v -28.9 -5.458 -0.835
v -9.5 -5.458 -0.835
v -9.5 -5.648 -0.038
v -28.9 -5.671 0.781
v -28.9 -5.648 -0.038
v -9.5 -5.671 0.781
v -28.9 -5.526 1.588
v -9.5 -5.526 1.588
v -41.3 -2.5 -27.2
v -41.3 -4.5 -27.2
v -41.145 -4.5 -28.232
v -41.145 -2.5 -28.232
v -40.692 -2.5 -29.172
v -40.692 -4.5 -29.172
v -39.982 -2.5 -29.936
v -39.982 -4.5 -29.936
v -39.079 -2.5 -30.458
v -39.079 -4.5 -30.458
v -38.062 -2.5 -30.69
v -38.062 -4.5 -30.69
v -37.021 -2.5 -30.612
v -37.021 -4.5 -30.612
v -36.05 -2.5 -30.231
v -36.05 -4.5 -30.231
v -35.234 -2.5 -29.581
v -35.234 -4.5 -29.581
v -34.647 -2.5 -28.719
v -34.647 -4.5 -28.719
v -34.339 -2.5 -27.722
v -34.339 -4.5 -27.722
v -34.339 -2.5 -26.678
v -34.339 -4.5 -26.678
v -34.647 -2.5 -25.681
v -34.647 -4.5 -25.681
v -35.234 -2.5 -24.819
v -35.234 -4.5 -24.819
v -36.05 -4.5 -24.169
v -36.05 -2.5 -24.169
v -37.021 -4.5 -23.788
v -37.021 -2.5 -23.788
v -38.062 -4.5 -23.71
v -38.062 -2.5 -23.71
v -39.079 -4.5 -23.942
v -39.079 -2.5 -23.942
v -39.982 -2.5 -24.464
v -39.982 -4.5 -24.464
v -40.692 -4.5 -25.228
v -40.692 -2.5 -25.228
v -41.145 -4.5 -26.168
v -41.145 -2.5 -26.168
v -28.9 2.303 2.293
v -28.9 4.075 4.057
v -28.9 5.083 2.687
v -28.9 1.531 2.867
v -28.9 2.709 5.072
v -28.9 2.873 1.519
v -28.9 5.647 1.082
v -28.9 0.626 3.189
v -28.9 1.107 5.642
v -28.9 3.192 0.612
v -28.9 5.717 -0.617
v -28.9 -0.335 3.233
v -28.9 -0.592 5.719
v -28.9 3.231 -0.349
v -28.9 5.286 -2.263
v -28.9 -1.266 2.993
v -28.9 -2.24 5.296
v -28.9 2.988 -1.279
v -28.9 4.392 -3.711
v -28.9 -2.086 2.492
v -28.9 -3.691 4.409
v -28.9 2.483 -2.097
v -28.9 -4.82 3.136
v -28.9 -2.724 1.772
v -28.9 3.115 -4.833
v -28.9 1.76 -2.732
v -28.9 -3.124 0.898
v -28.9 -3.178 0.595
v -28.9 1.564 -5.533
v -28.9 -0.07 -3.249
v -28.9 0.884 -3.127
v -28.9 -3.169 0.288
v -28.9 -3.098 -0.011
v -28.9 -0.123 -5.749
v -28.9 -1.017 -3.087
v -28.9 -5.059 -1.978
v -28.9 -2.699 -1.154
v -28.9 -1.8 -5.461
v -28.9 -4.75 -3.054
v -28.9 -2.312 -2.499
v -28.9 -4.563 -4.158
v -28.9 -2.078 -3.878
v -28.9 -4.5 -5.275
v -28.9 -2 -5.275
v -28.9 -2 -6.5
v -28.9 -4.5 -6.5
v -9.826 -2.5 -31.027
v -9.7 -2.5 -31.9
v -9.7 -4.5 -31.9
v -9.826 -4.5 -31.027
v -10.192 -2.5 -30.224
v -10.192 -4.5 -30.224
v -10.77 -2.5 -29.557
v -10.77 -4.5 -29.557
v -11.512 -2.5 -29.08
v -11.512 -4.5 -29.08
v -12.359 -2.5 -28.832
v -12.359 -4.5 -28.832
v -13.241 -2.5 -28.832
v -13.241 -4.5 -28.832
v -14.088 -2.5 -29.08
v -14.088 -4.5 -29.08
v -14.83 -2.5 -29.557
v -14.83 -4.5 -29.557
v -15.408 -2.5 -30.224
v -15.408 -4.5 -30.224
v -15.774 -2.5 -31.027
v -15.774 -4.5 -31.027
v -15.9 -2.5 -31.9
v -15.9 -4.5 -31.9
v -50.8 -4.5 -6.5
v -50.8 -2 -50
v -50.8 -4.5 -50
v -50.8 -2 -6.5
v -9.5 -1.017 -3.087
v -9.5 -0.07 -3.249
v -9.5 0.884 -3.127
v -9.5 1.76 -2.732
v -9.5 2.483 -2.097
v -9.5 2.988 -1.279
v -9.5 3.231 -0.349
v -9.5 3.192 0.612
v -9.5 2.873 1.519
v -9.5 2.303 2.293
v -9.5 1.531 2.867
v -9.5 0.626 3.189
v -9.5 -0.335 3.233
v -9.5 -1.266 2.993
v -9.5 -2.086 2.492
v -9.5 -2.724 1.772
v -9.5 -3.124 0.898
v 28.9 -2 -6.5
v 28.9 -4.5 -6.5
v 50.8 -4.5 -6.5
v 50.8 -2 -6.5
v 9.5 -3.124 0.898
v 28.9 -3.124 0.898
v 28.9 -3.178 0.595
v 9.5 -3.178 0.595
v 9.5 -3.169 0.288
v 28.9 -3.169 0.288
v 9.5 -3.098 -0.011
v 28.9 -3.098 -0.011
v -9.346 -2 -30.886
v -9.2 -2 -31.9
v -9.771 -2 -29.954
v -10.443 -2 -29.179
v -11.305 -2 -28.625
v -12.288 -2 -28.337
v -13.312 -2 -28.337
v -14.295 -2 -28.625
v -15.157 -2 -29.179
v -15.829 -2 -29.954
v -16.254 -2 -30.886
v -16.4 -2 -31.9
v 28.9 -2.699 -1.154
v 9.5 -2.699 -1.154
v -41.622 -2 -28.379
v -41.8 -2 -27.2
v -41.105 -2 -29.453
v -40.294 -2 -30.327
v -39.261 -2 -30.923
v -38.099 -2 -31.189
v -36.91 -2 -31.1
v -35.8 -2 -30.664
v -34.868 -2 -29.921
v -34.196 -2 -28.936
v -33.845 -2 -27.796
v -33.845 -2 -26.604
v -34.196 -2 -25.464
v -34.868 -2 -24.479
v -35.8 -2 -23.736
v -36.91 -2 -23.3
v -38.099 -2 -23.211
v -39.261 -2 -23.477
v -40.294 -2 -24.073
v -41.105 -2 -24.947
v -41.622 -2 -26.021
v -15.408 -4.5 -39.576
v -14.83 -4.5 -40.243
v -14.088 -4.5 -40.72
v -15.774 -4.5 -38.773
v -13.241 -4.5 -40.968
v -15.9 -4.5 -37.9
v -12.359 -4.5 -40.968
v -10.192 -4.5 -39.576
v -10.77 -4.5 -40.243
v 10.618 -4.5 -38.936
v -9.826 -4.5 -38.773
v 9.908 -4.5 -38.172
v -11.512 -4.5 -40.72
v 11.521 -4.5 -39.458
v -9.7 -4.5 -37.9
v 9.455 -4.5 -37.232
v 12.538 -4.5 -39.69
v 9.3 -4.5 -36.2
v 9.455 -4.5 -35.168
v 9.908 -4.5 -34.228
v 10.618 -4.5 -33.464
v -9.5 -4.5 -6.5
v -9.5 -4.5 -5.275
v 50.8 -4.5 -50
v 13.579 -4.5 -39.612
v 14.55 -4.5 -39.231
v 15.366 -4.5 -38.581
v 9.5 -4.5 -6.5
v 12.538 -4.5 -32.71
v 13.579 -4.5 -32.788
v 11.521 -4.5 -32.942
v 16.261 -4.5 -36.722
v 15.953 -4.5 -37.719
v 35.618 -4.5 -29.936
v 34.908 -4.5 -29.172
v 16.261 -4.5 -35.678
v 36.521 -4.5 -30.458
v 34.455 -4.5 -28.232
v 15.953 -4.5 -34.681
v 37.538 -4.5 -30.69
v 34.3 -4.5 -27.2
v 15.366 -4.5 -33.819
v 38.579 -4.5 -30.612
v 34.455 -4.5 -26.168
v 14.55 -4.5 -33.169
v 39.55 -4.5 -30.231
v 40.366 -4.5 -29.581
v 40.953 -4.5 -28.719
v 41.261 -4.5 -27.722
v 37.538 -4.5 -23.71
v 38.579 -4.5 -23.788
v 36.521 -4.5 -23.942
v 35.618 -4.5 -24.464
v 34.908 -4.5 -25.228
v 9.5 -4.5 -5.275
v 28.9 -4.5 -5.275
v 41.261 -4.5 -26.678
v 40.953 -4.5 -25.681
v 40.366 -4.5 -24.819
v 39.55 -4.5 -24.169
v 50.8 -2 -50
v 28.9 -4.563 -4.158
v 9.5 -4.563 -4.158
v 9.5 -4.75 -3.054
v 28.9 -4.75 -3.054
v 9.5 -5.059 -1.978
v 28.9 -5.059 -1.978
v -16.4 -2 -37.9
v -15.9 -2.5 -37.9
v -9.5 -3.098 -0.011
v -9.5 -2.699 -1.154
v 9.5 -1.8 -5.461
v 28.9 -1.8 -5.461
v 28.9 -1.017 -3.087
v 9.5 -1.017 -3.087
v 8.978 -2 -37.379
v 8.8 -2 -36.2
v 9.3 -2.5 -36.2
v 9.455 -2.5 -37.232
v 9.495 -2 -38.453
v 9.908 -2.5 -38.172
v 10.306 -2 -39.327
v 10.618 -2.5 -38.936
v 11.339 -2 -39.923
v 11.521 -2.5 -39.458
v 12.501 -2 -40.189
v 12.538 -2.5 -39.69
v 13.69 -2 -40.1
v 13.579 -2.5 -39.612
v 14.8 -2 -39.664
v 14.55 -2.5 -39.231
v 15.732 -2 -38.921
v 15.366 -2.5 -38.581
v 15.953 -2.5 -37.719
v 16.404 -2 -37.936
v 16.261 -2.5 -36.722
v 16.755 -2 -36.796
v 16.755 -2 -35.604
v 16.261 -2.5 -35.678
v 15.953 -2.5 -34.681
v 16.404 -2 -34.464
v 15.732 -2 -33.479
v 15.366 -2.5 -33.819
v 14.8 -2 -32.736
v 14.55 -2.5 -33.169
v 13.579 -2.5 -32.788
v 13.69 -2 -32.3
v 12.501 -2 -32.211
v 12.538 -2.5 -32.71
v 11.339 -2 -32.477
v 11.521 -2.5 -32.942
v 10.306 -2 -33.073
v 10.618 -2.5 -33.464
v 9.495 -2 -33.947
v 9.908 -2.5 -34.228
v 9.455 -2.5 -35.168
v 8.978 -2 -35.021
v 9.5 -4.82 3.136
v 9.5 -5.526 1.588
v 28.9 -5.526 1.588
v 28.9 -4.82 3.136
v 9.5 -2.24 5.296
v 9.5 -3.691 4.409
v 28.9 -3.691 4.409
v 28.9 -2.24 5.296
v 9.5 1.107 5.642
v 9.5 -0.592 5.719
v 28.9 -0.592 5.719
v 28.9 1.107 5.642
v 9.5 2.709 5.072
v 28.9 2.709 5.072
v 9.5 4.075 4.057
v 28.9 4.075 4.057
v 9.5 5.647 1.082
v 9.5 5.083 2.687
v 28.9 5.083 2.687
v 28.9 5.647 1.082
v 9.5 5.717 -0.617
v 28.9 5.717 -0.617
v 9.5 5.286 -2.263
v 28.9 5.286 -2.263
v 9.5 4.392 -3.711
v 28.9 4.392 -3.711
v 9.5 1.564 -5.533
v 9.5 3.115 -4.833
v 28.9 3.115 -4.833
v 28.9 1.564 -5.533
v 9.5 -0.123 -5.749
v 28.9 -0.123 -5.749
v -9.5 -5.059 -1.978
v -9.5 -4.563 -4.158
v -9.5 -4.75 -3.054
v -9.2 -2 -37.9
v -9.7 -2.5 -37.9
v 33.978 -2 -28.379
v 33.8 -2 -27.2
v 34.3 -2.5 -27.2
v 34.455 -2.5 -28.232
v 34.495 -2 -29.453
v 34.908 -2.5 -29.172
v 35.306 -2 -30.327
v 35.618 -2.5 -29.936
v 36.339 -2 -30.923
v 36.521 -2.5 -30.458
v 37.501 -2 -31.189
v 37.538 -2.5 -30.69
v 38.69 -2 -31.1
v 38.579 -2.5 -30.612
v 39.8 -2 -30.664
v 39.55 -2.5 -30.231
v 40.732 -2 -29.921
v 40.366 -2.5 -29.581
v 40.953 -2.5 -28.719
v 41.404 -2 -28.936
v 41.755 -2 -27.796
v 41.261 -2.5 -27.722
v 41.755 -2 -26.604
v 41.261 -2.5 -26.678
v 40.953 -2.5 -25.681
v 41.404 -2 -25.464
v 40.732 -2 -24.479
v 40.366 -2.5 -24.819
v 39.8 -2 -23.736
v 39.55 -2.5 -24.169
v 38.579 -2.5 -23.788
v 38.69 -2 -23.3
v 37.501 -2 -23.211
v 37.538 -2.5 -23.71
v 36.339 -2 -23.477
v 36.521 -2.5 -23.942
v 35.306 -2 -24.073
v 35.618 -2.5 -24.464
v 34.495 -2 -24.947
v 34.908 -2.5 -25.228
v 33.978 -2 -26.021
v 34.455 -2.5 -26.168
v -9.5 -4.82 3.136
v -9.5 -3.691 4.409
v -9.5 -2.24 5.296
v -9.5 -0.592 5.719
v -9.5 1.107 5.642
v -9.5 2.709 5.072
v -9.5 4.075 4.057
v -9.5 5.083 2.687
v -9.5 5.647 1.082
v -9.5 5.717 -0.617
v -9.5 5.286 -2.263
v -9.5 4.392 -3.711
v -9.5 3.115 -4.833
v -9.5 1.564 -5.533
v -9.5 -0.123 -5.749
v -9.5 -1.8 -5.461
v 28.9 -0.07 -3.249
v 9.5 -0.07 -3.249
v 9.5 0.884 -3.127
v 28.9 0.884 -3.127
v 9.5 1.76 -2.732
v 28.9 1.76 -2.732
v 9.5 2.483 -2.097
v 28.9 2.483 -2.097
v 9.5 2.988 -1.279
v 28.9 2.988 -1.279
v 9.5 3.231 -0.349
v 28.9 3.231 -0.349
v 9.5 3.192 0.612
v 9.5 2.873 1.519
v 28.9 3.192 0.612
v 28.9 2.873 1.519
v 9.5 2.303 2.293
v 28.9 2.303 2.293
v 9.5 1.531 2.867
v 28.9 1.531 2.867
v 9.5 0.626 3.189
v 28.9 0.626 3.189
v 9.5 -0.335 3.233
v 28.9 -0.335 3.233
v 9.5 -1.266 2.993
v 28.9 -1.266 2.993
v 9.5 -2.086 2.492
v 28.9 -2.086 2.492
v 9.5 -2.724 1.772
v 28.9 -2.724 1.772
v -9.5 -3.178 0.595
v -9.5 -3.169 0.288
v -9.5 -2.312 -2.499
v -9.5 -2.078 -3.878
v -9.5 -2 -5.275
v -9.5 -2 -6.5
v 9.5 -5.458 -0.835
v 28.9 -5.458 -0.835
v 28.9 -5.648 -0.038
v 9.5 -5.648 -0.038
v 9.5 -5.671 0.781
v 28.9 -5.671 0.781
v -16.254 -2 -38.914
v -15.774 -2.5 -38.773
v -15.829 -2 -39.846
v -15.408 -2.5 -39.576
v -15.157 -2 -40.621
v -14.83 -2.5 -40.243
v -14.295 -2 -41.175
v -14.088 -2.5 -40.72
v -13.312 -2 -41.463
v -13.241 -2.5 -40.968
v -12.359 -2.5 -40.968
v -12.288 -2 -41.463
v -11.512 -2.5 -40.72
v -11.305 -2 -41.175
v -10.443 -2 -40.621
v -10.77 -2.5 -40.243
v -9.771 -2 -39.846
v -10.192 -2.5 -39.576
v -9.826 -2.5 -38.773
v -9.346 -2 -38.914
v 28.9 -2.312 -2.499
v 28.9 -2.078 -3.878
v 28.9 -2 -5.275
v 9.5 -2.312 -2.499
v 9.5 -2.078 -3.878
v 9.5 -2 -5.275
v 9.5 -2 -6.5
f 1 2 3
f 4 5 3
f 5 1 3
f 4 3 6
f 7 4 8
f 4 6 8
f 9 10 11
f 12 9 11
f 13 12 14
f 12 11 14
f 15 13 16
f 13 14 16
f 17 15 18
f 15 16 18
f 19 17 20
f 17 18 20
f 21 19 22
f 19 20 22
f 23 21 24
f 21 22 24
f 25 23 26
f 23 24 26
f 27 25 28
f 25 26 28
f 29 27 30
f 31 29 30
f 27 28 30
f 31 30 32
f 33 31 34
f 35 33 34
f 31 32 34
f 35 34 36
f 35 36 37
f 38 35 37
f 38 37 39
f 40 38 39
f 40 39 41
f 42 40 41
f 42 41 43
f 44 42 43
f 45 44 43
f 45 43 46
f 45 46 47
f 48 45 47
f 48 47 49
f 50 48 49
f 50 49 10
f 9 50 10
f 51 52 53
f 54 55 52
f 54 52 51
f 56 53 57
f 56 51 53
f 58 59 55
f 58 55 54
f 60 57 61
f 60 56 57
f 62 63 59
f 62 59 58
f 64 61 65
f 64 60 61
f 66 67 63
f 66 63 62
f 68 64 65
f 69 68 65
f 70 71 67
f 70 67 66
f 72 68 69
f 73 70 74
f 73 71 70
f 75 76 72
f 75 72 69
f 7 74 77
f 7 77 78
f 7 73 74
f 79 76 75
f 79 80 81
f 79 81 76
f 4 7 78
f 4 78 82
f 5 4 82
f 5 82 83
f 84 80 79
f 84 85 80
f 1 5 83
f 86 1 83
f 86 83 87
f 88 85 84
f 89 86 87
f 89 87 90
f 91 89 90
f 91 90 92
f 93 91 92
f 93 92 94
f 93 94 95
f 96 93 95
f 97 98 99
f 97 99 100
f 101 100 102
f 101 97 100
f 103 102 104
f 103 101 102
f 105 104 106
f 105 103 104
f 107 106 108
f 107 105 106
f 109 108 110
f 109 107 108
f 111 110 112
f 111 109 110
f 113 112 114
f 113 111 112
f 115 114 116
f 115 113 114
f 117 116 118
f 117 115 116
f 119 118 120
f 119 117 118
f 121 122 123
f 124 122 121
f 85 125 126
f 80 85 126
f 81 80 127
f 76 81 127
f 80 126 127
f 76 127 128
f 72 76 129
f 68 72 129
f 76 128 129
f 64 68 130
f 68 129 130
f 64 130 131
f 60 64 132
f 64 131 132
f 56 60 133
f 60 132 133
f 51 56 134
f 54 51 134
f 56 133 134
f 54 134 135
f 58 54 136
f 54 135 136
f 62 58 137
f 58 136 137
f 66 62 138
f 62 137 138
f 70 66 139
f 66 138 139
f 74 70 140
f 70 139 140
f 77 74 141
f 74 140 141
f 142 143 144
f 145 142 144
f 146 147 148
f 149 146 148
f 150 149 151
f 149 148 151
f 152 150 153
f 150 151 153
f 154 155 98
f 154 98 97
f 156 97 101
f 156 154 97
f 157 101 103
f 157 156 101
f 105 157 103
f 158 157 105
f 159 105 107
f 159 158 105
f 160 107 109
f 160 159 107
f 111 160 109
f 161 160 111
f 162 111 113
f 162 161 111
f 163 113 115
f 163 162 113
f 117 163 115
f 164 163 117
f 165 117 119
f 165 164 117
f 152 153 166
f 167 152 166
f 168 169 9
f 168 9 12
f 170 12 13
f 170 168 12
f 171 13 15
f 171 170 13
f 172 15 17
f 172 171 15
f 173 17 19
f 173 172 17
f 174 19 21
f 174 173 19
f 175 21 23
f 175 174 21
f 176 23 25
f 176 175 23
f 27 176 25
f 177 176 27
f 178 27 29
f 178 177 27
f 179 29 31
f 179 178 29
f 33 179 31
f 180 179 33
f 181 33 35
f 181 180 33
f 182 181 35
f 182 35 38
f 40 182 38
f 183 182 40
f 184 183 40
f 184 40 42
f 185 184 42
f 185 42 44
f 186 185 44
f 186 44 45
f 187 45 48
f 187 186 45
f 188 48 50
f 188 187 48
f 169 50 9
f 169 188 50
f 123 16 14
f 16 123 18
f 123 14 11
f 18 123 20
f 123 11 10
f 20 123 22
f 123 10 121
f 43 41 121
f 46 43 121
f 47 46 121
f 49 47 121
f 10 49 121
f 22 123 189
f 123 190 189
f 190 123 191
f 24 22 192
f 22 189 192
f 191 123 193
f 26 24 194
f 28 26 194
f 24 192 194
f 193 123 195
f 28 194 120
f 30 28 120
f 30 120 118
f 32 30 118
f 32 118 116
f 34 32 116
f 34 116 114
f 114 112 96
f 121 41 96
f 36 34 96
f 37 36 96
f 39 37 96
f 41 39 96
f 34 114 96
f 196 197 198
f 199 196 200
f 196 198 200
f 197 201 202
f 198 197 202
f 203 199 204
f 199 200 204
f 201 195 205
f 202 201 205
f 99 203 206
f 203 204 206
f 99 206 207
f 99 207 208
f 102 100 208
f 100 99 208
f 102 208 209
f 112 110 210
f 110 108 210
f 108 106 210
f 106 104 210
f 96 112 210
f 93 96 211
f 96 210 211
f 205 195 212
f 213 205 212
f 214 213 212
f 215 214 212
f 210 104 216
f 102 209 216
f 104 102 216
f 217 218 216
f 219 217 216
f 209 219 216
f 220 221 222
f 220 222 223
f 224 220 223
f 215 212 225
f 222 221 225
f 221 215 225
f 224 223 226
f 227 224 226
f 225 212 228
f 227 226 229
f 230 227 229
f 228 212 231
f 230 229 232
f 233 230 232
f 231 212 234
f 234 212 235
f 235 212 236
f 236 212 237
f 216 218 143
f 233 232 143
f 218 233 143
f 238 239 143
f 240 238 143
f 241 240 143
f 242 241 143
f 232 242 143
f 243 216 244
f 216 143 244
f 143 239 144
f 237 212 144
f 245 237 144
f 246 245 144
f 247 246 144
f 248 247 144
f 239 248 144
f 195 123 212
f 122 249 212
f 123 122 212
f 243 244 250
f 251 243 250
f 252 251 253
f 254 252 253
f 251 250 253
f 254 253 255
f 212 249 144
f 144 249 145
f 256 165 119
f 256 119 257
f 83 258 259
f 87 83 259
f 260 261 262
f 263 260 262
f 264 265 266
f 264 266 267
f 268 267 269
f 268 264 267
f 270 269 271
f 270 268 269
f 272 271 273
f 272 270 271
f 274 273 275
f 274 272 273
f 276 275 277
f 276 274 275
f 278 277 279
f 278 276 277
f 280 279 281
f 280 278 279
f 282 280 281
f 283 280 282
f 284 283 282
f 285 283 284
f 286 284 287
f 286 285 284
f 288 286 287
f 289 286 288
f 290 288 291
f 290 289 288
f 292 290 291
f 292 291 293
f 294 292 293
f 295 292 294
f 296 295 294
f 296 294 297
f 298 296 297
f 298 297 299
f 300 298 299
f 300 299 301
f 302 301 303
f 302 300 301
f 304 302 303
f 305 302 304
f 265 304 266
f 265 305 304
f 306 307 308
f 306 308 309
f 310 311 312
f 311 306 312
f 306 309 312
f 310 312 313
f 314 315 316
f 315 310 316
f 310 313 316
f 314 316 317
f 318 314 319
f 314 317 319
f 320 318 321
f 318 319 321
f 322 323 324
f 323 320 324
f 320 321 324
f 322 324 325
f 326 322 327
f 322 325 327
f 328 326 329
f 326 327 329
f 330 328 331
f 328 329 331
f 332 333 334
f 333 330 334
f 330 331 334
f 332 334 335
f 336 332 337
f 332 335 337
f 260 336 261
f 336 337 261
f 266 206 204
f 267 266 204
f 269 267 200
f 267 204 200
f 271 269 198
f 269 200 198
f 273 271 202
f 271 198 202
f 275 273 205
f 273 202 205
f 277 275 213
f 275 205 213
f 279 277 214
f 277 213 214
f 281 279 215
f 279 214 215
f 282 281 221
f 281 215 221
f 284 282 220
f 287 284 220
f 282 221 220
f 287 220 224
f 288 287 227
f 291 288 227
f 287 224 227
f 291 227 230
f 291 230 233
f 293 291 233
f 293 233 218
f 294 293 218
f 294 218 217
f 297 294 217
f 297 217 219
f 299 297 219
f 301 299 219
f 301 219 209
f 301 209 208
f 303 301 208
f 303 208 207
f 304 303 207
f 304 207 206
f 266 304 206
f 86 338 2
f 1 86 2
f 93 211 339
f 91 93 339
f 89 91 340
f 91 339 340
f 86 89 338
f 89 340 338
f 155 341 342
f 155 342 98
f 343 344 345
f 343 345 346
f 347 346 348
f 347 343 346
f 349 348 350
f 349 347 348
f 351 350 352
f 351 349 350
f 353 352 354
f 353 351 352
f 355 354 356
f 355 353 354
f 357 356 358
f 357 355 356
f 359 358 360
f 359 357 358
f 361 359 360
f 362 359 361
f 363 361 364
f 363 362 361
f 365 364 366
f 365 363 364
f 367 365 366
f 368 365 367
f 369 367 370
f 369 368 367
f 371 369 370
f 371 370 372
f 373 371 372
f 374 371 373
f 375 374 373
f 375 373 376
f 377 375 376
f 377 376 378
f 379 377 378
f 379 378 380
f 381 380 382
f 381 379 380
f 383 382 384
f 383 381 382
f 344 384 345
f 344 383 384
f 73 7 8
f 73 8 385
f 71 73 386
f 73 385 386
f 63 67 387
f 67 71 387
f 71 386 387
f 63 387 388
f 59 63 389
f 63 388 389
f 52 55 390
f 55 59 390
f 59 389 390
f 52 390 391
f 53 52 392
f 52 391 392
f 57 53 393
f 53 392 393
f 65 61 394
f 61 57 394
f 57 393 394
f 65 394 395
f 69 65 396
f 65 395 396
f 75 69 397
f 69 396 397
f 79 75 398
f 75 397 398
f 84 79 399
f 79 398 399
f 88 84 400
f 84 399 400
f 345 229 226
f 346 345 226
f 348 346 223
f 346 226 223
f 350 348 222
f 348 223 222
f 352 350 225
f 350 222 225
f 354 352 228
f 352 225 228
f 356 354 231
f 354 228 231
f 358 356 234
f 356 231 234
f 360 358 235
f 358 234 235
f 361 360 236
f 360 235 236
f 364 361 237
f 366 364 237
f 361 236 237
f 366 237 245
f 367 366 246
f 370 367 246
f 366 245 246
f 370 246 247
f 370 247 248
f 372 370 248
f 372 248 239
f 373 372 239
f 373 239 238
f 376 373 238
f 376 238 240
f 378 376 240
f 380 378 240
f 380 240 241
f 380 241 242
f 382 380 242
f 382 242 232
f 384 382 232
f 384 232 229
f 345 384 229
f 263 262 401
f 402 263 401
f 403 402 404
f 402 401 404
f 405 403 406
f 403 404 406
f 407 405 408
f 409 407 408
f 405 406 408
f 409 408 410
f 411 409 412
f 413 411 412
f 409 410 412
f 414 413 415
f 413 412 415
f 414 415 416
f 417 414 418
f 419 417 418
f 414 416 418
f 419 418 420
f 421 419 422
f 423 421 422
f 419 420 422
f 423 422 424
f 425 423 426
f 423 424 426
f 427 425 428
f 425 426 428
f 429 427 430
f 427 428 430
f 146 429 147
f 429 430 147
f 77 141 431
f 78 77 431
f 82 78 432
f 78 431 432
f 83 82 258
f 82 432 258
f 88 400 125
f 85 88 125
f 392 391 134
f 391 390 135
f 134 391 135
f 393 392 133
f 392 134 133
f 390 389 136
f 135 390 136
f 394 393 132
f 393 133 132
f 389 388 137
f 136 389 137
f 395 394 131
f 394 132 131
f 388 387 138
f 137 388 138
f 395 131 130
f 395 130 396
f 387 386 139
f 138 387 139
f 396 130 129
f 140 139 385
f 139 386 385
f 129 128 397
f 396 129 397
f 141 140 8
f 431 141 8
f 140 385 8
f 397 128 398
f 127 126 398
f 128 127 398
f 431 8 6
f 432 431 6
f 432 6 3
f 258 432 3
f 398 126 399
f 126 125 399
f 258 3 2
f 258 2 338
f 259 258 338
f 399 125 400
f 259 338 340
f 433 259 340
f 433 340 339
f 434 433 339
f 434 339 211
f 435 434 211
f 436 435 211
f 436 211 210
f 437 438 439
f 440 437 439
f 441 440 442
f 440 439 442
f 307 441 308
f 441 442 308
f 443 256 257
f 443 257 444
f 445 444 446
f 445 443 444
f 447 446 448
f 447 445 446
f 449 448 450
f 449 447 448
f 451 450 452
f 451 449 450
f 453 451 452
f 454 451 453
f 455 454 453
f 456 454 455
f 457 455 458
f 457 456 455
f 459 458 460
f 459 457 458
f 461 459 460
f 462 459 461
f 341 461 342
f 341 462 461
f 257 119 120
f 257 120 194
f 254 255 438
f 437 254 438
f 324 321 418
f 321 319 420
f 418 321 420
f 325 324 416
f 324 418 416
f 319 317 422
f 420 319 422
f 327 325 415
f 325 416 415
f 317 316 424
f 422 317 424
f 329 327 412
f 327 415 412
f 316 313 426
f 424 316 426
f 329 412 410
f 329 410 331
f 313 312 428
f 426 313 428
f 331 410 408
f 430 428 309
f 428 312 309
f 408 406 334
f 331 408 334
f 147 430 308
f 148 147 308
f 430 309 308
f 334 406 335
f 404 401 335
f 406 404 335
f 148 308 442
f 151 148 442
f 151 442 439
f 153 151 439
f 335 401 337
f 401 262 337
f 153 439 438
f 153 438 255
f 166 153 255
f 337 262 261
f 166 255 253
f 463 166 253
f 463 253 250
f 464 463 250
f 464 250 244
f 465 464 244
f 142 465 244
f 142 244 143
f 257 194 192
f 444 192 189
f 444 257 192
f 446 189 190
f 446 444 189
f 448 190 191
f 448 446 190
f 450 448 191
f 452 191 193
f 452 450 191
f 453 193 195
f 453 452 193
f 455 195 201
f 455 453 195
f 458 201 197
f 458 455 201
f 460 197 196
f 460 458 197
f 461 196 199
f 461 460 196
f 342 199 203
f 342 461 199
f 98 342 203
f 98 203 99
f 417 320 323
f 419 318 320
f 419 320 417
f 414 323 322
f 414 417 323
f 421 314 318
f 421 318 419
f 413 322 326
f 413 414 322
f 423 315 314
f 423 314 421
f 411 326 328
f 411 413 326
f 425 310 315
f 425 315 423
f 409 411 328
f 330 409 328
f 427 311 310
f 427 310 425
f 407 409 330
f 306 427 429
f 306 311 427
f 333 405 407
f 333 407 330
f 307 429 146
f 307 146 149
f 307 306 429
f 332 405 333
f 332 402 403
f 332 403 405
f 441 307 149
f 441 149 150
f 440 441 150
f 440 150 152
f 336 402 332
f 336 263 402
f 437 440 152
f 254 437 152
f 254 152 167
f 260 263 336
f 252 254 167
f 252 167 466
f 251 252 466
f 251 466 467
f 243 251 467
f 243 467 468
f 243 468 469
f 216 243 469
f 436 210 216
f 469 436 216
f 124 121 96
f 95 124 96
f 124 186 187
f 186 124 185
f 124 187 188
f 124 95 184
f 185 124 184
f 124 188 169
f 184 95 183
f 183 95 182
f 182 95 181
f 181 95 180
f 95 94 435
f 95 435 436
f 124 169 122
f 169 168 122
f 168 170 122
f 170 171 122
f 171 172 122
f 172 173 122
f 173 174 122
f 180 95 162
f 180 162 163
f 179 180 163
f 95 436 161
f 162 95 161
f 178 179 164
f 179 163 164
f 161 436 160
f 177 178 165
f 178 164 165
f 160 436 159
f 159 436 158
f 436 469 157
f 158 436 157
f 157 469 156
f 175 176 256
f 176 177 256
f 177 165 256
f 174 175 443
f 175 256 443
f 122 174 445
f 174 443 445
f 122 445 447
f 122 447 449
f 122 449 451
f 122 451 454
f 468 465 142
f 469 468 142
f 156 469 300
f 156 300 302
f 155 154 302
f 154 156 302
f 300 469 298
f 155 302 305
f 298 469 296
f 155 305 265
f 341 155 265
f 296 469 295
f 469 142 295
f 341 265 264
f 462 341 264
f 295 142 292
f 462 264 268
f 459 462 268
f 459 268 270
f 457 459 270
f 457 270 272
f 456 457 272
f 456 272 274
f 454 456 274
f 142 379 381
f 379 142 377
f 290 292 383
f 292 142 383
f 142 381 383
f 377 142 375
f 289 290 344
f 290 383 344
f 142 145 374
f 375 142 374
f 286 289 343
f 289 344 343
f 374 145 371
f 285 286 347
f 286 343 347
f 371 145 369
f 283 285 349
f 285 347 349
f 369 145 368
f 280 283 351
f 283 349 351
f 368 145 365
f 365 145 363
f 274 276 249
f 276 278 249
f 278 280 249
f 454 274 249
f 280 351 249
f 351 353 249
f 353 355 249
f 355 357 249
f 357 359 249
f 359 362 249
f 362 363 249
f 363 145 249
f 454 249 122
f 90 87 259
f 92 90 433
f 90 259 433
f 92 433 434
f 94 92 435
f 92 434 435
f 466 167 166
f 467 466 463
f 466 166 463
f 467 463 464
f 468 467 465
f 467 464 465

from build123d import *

# Parameters (mm, degrees)
BASE_FLANGE1_DEPTH           = 50.8
CUT_EXTRUDE1_DEPTH           = 72.510156621
CUT_EXTRUDE1_DEPTH_BACK      = 72.510156621
SKETCH6_W                    = 21.9
SKETCH6_H                    = 58.896012785
SKETCH6_W_2                  = 19
F_7_0_7_DIAMETER_HOLE1_D     = 7
F_7_0_7_DIAMETER_HOLE1_DEPTH = 10
F_7_0_7_DIAMETER_HOLE1_TIP   = 2.103012167
CUT_EXTRUDE2_DEPTH           = 10
CHAMFER1_SIZE                = 0.5


# Sheet-metal steps are written as plain solids
with BuildPart() as part:
    # Sketch1 → Base-Flange1 (new, symmetric)
    with BuildSketch(Plane(origin=(0, 0, 0), x_dir=(0, 0, -1), z_dir=(1, 0, 0))):
        with BuildLine():
            Line((50, -4.5), (5.275314915, -4.5))
            ThreePointArc((5.275314915, -4.5), (3.603327521, -4.640767872), (1.978412548, -5.059108369))
            Line((1.978412548, -5.059108369), (0.835379329, -5.458272884))
            ThreePointArc((0.835379329, -5.458272884), (-0.371159142, -5.680341687), (-1.588253888, -5.526296191))
            ThreePointArc((-1.588253888, -5.526296191), (-2.687165368, 5.083467546), (5.460998077, -1.8))
            Line((5.460998077, -1.8), (3.086651087, -1.017391304))
            ThreePointArc((3.086651087, -1.017391304), (-1.518832599, 2.873264265), (-0.897708719, -3.123558716))
            ThreePointArc((-0.897708719, -3.123558716), (-0.44129819, -3.181325777), (0.011153737, -3.098049977))
            Line((0.011153737, -3.098049977), (1.154186957, -2.698885462))
            ThreePointArc((1.154186957, -2.698885462), (3.185330673, -2.17595984), (5.275314915, -2))
            Line((5.275314915, -2), (50, -2))
            Line((50, -2), (50, -4.5))
        make_face()
    extrude(amount=BASE_FLANGE1_DEPTH, both=True)

    # Sketch6 → Cut-Extrude1 (cut, two sides: drawn at the far end of the back side and taken through both)
    with BuildSketch(Plane(origin=(0, 0, 0), x_dir=(1, 0, 0), z_dir=(0, 1, 0)).offset(-CUT_EXTRUDE1_DEPTH_BACK)):
        with Locations((-39.85, -22.948006393)):
            Rectangle(SKETCH6_W, SKETCH6_H)
        with Locations((39.85, -22.948006393)):
            Rectangle(SKETCH6_W, SKETCH6_H)
        with Locations((0, -22.948006393)):
            Rectangle(SKETCH6_W_2, SKETCH6_H)
    extrude(amount=CUT_EXTRUDE1_DEPTH + CUT_EXTRUDE1_DEPTH_BACK, mode=Mode.SUBTRACT)

    # Ø7.0 (7) Diameter Hole1
    with Locations(Plane(origin=(0, -2, 0), x_dir=(1, 0, 0), z_dir=(0, 1, 0))):
        with Locations((37.8, 27.2), (-37.8, 27.2), (12.8, 36.2)):
            Hole(F_7_0_7_DIAMETER_HOLE1_D / 2, depth=F_7_0_7_DIAMETER_HOLE1_DEPTH)
            with Locations((0, 0, -(F_7_0_7_DIAMETER_HOLE1_DEPTH + F_7_0_7_DIAMETER_HOLE1_TIP / 2))):  # 118° drill point
                Cone(0, F_7_0_7_DIAMETER_HOLE1_D / 2, F_7_0_7_DIAMETER_HOLE1_TIP, mode=Mode.SUBTRACT)

    # Sketch9 → Cut-Extrude2 (cut)
    with BuildSketch(Plane(origin=(0, -2, 0), x_dir=(1, 0, 0), z_dir=(0, 1, 0))):
        with BuildLine():
            Line((-9.7, 37.9), (-9.7, 31.9))
            ThreePointArc((-9.7, 31.9), (-12.8, 28.8), (-15.9, 31.9))
            Line((-15.9, 31.9), (-15.9, 37.9))
            ThreePointArc((-15.9, 37.9), (-12.8, 41), (-9.7, 37.9))
        make_face()
    extrude(amount=-CUT_EXTRUDE2_DEPTH, mode=Mode.SUBTRACT)

    # Chamfer1
    chamfer1_edges = [part.edges().sort_by_distance(p)[0] for p in [
        (16.3, -2, -36.2),
        (-34.3, -2, -27.2),
        (41.3, -2, -27.2),
        (-12.8, -2, -41),
        (-15.9, -2, -34.9),
        (-12.8, -2, -28.8),
        (-9.7, -2, -34.9),
    ]]
    chamfer(chamfer1_edges, length=CHAMFER1_SIZE)


solid = part.part
